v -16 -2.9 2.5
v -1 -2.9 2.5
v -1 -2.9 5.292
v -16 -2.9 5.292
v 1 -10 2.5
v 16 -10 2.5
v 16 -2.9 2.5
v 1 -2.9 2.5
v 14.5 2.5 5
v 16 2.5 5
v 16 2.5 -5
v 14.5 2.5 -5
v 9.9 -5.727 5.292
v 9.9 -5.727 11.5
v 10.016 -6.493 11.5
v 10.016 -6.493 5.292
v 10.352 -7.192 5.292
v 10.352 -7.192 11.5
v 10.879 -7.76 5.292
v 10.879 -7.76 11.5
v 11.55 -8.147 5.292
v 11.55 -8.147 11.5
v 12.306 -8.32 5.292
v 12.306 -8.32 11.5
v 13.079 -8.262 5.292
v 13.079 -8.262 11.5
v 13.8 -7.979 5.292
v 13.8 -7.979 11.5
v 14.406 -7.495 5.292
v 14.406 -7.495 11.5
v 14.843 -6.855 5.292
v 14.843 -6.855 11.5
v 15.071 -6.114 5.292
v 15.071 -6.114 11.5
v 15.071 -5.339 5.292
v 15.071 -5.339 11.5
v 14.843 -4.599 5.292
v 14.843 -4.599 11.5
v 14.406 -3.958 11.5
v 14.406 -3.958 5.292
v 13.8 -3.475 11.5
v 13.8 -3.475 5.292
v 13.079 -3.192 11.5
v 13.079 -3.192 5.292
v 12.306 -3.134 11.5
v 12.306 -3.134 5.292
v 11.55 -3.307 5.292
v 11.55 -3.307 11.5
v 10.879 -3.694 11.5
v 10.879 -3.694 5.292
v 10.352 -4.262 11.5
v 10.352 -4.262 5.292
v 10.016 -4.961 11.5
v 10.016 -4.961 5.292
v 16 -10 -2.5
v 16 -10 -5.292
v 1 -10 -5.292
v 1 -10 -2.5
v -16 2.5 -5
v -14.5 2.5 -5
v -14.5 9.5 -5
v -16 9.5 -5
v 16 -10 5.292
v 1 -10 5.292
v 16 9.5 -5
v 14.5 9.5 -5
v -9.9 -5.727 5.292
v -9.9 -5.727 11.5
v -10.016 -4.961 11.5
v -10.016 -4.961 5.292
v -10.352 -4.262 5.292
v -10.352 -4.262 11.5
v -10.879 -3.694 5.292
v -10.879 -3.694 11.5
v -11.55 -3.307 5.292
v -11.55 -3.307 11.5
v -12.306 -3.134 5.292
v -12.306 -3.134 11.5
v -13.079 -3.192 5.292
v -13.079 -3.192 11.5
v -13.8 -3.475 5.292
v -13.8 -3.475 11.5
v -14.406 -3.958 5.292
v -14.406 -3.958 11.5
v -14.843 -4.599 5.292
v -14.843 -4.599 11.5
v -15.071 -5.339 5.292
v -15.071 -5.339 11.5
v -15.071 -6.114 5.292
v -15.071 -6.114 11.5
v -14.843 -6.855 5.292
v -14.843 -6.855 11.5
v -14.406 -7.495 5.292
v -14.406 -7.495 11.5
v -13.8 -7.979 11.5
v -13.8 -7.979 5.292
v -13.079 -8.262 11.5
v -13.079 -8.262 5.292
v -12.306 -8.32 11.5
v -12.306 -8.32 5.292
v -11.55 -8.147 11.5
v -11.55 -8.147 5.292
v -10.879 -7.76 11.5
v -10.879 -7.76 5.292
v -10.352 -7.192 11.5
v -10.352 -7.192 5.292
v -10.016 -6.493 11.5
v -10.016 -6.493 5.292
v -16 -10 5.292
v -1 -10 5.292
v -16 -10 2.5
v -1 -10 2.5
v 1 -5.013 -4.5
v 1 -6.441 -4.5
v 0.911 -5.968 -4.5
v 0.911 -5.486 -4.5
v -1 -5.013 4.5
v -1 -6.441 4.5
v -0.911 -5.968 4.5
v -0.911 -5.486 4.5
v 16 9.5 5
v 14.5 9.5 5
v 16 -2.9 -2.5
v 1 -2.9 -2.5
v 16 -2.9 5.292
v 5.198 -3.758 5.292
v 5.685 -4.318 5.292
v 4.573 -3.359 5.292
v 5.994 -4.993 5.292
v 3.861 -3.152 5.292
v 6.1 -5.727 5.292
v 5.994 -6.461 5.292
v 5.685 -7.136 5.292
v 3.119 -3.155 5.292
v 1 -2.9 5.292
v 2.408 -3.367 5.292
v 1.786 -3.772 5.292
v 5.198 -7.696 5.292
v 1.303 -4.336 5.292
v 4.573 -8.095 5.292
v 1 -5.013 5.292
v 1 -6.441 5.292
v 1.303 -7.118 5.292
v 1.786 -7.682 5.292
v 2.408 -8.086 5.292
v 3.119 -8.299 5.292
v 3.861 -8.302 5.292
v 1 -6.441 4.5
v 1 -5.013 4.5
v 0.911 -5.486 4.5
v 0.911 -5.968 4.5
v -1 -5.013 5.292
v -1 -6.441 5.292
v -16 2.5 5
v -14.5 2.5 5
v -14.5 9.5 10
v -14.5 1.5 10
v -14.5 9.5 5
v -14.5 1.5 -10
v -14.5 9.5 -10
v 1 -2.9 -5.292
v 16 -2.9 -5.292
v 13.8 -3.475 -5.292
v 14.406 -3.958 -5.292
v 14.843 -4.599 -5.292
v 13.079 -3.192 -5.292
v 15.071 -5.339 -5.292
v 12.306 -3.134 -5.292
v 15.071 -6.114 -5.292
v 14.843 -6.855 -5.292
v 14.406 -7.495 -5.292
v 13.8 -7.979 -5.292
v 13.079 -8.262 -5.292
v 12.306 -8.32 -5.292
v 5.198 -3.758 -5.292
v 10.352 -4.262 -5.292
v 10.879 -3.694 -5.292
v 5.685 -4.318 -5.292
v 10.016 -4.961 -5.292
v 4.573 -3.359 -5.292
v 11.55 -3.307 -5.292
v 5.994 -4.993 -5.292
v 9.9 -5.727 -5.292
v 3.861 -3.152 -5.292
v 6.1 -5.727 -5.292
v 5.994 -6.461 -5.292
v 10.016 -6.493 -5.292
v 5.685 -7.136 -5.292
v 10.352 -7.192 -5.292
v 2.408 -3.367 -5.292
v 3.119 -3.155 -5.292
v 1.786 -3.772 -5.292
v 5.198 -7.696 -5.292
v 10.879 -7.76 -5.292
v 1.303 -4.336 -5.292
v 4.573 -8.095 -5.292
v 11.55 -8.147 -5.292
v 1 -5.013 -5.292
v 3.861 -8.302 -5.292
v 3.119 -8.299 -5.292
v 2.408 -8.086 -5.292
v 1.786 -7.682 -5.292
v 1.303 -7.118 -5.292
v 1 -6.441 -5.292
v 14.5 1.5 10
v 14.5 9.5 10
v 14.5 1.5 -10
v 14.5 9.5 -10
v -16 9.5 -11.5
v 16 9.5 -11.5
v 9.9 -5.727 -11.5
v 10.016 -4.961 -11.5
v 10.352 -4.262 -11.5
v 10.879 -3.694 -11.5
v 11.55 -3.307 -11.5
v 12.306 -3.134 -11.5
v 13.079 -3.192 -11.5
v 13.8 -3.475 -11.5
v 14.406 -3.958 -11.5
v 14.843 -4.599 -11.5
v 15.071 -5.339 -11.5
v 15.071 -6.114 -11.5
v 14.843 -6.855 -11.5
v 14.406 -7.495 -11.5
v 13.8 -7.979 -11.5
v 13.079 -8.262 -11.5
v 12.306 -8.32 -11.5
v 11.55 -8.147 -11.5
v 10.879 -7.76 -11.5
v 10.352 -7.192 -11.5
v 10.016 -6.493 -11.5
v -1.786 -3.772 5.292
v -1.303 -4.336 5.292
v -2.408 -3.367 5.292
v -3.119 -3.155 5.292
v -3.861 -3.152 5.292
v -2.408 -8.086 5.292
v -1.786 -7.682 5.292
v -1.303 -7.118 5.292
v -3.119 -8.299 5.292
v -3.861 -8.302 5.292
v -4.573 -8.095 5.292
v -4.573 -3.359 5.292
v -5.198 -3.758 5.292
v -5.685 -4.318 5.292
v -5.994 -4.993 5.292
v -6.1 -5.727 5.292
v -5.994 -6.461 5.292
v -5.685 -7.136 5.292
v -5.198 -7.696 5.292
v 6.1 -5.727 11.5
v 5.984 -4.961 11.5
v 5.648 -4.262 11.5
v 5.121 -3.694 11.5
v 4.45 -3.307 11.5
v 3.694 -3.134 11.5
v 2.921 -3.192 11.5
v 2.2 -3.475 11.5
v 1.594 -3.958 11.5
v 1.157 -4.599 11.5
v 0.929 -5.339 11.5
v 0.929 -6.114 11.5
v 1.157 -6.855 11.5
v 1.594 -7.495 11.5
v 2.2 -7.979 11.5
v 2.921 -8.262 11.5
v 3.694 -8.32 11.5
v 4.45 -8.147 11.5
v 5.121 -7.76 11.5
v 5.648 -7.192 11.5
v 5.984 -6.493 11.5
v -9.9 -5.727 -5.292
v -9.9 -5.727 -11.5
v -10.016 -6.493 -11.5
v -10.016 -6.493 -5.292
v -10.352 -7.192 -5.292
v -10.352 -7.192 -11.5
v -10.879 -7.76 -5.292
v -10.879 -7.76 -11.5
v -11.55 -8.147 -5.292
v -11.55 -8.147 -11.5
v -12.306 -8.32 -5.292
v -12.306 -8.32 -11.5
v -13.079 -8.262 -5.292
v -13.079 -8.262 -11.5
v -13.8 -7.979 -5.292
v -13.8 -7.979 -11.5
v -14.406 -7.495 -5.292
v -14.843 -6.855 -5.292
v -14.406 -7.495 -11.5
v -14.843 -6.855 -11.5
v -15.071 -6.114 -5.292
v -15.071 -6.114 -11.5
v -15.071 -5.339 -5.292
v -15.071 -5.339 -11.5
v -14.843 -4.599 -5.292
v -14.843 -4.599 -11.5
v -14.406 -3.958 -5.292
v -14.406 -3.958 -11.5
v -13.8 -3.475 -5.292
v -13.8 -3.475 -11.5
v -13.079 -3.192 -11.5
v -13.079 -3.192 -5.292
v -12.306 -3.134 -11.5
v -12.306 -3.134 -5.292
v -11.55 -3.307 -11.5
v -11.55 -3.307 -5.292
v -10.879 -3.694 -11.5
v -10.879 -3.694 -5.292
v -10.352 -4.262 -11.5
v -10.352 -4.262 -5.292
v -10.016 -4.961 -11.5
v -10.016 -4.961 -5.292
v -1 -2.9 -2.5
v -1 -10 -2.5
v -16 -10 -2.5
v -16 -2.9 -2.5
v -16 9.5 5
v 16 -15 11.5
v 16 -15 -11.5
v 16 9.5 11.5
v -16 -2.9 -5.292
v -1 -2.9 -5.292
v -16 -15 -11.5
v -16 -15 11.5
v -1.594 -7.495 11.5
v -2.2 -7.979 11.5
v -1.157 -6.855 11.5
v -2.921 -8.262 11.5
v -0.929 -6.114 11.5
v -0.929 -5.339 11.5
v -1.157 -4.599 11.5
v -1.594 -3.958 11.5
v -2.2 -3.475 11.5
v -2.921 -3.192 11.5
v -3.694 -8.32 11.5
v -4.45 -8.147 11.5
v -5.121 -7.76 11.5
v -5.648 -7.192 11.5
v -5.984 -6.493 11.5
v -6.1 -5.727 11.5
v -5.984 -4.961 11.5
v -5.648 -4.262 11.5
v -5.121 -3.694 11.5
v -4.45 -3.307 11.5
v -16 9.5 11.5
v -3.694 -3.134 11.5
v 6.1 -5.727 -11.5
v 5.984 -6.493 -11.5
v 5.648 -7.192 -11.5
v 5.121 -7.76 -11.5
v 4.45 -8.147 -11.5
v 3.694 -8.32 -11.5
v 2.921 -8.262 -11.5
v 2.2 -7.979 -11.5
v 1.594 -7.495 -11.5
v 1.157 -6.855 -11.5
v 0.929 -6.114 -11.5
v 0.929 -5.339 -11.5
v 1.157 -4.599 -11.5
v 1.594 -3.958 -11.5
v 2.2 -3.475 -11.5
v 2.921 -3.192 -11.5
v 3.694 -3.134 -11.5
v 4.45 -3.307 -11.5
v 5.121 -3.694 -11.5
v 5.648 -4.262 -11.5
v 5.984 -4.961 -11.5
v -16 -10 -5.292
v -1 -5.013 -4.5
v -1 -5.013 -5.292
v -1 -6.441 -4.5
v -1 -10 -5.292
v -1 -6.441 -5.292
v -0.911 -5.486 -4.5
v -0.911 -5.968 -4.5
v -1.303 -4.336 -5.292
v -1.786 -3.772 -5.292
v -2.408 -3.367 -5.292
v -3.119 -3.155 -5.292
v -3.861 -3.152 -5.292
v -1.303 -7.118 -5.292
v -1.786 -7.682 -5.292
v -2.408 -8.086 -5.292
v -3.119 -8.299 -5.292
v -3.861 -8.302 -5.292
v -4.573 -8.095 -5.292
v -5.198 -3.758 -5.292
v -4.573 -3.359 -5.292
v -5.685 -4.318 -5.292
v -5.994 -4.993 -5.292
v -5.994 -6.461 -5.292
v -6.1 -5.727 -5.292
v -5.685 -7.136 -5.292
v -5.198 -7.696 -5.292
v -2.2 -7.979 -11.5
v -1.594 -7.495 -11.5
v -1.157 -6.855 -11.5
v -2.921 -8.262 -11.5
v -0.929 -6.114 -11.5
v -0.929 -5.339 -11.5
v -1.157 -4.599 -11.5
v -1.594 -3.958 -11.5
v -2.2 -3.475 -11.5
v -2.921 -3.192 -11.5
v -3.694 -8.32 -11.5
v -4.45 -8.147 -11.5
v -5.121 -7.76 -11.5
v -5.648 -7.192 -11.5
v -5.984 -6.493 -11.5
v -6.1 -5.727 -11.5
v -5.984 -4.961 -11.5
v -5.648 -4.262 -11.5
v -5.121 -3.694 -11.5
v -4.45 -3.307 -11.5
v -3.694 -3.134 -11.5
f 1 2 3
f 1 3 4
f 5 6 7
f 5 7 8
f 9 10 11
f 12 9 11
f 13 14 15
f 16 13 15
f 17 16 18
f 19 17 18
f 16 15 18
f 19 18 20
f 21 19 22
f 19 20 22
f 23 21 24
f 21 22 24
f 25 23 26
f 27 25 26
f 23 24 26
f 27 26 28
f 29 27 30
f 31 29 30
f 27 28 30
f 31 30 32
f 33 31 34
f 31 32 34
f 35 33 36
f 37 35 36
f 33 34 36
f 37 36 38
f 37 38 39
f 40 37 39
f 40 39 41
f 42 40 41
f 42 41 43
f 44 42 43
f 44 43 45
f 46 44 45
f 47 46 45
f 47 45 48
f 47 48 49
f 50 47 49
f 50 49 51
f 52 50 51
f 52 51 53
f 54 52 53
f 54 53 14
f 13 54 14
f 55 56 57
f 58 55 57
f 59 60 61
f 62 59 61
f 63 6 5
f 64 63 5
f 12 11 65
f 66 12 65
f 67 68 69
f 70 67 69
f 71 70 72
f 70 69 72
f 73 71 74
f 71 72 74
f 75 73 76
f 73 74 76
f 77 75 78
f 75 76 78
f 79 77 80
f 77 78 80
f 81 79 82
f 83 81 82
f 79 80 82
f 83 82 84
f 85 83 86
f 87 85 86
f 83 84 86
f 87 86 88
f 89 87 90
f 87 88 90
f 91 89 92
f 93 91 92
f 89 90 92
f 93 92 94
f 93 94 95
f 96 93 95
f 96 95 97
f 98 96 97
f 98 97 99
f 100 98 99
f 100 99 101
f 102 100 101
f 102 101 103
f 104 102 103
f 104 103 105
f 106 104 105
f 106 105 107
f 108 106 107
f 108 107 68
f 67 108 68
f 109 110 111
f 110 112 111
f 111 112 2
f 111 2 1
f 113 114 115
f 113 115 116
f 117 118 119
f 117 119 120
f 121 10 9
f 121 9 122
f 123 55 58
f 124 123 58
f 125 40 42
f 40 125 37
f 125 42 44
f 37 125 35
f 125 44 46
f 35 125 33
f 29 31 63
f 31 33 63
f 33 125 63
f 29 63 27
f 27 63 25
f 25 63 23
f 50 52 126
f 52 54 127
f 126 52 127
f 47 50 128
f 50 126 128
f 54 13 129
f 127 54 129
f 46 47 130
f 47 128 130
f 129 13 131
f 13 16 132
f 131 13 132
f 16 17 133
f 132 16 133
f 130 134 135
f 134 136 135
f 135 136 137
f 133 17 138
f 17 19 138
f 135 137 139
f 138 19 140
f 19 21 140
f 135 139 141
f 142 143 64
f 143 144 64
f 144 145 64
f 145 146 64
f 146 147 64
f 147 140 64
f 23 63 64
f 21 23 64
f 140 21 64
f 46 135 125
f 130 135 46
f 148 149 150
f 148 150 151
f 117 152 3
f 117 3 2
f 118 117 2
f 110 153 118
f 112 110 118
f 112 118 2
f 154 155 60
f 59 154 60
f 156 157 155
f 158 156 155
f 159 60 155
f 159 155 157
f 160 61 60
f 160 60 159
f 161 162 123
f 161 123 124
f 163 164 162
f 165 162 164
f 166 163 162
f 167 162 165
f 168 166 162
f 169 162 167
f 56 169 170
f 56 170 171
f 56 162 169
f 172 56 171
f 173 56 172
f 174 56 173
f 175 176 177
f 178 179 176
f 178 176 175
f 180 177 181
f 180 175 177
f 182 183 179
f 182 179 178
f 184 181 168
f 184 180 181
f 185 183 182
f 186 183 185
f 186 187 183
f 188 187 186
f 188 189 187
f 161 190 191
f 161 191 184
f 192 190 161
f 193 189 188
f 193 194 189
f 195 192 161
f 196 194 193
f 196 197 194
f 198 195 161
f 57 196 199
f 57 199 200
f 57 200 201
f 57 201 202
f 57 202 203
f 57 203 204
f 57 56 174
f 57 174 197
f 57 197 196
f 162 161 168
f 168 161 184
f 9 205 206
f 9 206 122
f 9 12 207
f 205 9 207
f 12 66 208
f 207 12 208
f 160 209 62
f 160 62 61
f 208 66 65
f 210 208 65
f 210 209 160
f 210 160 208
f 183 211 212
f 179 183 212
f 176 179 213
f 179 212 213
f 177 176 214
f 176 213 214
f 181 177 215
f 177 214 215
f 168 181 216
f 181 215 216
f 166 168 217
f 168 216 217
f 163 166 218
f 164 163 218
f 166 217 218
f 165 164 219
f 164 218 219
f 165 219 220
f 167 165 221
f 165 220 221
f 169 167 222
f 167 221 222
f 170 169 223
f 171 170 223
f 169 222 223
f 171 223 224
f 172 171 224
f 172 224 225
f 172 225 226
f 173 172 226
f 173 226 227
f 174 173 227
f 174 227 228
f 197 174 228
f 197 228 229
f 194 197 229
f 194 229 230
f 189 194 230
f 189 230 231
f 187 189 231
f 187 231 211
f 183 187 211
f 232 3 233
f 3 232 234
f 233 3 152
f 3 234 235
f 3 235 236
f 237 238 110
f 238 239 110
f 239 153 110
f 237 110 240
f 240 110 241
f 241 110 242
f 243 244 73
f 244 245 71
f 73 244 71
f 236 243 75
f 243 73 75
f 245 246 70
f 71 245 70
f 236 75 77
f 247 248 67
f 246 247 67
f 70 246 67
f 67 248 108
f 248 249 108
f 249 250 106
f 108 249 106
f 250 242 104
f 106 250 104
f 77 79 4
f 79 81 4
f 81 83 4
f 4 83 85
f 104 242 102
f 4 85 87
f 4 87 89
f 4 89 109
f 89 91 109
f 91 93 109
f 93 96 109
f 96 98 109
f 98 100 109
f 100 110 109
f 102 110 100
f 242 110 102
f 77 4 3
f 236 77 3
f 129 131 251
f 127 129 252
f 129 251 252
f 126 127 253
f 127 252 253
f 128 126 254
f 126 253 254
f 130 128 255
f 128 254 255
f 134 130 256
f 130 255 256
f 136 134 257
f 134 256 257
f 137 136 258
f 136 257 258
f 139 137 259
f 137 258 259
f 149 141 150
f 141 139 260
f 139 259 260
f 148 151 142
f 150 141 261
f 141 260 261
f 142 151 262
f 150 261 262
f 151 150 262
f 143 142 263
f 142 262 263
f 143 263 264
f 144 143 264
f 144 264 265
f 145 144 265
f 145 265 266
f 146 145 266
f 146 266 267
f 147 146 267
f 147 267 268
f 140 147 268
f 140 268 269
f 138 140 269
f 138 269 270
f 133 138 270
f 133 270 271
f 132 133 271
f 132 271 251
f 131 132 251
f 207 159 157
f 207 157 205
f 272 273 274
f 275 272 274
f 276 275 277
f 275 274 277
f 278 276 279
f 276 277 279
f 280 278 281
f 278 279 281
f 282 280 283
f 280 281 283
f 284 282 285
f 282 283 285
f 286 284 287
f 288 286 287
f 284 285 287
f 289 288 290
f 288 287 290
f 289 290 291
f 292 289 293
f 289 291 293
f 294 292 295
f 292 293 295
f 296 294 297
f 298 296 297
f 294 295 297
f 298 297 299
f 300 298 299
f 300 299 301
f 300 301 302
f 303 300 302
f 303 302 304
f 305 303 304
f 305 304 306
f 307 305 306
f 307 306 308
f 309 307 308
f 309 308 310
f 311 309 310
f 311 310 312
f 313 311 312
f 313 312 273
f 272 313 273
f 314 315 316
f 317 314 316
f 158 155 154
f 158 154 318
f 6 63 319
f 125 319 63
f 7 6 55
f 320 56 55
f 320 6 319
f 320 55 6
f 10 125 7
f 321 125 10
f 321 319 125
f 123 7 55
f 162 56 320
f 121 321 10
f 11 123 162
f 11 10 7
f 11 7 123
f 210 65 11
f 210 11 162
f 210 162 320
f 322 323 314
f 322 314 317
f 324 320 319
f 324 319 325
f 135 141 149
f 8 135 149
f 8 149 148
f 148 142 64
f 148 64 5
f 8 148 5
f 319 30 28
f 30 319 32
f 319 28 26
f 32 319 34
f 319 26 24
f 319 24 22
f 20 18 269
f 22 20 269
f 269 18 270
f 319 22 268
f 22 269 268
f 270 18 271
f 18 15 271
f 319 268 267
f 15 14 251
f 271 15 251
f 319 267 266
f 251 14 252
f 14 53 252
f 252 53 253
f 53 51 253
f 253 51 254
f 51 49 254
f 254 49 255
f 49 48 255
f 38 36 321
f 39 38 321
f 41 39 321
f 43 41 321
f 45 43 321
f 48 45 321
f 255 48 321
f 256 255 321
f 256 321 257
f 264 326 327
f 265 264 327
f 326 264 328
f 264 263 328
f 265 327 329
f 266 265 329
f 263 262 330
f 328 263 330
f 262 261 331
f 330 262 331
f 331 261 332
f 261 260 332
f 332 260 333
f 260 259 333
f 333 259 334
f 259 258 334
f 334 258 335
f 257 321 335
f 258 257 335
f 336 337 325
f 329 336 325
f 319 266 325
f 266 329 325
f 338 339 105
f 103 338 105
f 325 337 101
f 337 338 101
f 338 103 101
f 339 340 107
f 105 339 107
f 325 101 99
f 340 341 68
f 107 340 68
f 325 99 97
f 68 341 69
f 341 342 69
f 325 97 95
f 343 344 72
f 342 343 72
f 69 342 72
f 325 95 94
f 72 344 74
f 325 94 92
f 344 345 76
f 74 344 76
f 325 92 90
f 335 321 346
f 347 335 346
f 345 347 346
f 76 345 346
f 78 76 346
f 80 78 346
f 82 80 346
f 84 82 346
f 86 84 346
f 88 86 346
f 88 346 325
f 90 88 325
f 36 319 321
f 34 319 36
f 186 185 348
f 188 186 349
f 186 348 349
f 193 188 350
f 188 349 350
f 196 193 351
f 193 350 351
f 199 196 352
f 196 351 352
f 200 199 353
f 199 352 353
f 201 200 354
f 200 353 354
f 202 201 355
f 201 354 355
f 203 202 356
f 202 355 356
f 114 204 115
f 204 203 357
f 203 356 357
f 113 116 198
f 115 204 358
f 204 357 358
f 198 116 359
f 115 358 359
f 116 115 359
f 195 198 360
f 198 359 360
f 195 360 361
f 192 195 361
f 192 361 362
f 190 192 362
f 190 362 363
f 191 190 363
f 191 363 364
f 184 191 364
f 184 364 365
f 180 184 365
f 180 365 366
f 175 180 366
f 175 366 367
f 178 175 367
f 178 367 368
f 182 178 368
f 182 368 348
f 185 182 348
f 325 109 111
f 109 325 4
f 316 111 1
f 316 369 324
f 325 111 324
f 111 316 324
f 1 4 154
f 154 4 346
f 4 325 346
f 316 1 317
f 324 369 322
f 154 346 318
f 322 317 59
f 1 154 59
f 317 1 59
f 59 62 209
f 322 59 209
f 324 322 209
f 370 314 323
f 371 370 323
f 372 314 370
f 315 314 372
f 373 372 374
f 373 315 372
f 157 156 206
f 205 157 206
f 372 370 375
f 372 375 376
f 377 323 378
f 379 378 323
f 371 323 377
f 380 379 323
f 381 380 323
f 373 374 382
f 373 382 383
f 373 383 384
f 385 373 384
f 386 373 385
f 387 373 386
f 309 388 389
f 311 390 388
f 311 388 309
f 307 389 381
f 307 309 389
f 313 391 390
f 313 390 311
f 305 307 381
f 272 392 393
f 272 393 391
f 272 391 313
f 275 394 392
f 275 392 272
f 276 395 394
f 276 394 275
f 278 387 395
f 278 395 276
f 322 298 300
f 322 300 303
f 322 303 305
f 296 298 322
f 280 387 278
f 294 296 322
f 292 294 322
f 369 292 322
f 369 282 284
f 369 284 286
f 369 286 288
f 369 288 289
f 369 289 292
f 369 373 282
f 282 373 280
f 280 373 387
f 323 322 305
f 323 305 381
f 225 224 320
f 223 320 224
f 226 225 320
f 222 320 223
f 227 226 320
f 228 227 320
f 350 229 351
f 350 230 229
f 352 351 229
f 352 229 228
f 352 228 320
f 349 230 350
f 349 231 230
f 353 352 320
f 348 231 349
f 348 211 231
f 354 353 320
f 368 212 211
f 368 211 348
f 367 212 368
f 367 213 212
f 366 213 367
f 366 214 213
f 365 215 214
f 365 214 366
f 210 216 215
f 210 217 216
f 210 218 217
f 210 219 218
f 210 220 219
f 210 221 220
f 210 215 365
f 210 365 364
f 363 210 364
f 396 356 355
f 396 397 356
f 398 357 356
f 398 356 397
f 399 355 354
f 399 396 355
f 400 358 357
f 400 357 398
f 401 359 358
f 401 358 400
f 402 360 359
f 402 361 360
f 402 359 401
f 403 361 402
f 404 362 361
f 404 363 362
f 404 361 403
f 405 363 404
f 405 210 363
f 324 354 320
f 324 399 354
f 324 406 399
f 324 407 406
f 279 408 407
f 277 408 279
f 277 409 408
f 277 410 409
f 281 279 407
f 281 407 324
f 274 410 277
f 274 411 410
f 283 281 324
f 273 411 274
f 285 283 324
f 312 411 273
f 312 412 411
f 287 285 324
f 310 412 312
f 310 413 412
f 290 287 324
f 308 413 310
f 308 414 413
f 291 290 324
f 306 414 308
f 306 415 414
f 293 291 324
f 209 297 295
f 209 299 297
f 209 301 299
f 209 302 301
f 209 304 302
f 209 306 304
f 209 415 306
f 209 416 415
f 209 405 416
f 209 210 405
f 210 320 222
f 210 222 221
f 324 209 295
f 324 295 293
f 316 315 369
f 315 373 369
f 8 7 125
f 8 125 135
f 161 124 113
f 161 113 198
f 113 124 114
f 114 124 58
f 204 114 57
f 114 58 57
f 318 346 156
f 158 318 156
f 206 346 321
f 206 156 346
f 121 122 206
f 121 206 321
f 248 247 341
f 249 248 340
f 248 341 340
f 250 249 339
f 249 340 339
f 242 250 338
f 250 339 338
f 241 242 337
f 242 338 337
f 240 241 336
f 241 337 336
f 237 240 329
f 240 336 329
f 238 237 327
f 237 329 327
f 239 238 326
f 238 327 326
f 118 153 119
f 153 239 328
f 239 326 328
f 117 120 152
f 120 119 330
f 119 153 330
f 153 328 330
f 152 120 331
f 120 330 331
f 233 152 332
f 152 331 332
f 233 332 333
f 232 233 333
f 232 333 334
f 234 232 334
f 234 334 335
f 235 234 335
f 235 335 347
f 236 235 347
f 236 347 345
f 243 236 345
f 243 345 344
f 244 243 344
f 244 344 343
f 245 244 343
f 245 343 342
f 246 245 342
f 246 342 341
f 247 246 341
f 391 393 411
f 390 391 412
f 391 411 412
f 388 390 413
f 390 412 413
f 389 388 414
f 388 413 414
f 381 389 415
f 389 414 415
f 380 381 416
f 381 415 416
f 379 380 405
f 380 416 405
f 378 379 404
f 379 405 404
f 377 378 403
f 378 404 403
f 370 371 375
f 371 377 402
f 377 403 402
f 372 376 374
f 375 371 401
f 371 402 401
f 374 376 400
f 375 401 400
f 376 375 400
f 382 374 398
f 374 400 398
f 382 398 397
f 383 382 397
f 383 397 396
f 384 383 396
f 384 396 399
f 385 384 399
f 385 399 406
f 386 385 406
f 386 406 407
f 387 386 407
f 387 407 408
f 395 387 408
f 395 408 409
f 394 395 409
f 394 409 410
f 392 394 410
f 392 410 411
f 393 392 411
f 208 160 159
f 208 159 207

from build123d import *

# Parameters (mm, degrees)
SKETCH4_W           = 32
SKETCH4_H           = 23
BOSS_EXTRUDE3_DEPTH = 9.5
SKETCH5_W           = 29
SKETCH5_H           = 20
CUT_EXTRUDE2_DEPTH  = 8
SKETCH7_W           = 10
SKETCH7_H           = 7
CUT_EXTRUDE4_DEPTH  = 36.305806888
SKETCH8_W           = 32
SKETCH8_H           = 23
BOSS_EXTRUDE4_DEPTH = 10
SKETCH12_R          = 2.6
CUT_EXTRUDE5_DEPTH  = 7
CIRPATTERN1_COUNT   = 2
CIRPATTERN1_ANGLE   = 180
SKETCH13_W          = 15
SKETCH13_H          = 2.791622882
CUT_EXTRUDE6_DEPTH  = 7.1
SKETCH14_W          = 32
SKETCH14_H          = 23
BOSS_EXTRUDE5_DEPTH = 5


with BuildPart() as part:
    # Sketch4 → Boss-Extrude3 (new body)
    with BuildSketch(Plane(origin=(0, 0, 0), x_dir=(1, 0, 0), z_dir=(0, 1, 0))):
        Rectangle(SKETCH4_W, SKETCH4_H)
    extrude(amount=BOSS_EXTRUDE3_DEPTH)

    # Sketch5 → Cut-Extrude2 (cut)
    with BuildSketch(Plane(origin=(0, 9.5, 0), x_dir=(1, 0, 0), z_dir=(0, 1, 0))):
        Rectangle(SKETCH5_W, SKETCH5_H)
    extrude(amount=-CUT_EXTRUDE2_DEPTH, mode=Mode.SUBTRACT)

    # Sketch7 → Cut-Extrude4 (cut, through all)
    with BuildSketch(Plane(origin=(16, 0, 0), x_dir=(0, 0, -1), z_dir=(1, 0, 0))):
        with Locations((0, 6)):
            Rectangle(SKETCH7_W, SKETCH7_H)
    extrude(amount=-CUT_EXTRUDE4_DEPTH, mode=Mode.SUBTRACT)

    # Sketch8 → Boss-Extrude4 (add)
    with BuildSketch(Plane(origin=(0, 0, 0), x_dir=(-1, 0, 0), z_dir=(0, -1, 0))):
        Rectangle(SKETCH8_W, SKETCH8_H)
    extrude(amount=BOSS_EXTRUDE4_DEPTH)

    # Sketch12 → Cut-Extrude5 (cut)
    with BuildSketch(Plane(origin=(0, 0, -11.5), x_dir=(-1, 0, 0), z_dir=(0, 0, -1))):
        with Locations((-12.5, -5.726898225)):
            Circle(SKETCH12_R)
        with Locations(Location((-3.5, -5.726898225, 0), (0, 0, 180))):
            Circle(SKETCH12_R)
        with Locations((3.5, -5.726898225)):
            Circle(SKETCH12_R)
        with Locations(Location((12.5, -5.726898225, 0), (0, 0, 180))):
            Circle(SKETCH12_R)
    cut_extrude5 = extrude(amount=-CUT_EXTRUDE5_DEPTH, mode=Mode.SUBTRACT)

    # CirPattern1: Cut-Extrude5 ×2 about axis
    cirpattern1_axis = Axis((0, 1.5, 0), (0, -1, 0))
    for i in range(1, CIRPATTERN1_COUNT):
        add(cut_extrude5.rotate(cirpattern1_axis, i * CIRPATTERN1_ANGLE / (CIRPATTERN1_COUNT - 1)), mode=Mode.SUBTRACT)

    # Sketch13 → Cut-Extrude6 (cut)
    with BuildSketch(Plane(origin=(0, -10, 0), x_dir=(-1, 0, 0), z_dir=(0, -1, 0))):
        with Locations((8.5, 3.895811441)):
            Rectangle(SKETCH13_W, SKETCH13_H)
        with Locations((-8.5, 3.895811441)):
            Rectangle(SKETCH13_W, SKETCH13_H)
        with Locations((-8.5, -3.895811441)):
            Rectangle(SKETCH13_W, SKETCH13_H)
        with Locations((8.5, -3.895811441)):
            Rectangle(SKETCH13_W, SKETCH13_H)
    extrude(amount=-CUT_EXTRUDE6_DEPTH, mode=Mode.SUBTRACT)

    # Sketch14 → Boss-Extrude5 (add)
    with BuildSketch(Plane(origin=(0, -10, 0), x_dir=(-1, 0, 0), z_dir=(0, -1, 0))):
        Rectangle(SKETCH14_W, SKETCH14_H)
    extrude(amount=BOSS_EXTRUDE5_DEPTH)


solid = part.part
